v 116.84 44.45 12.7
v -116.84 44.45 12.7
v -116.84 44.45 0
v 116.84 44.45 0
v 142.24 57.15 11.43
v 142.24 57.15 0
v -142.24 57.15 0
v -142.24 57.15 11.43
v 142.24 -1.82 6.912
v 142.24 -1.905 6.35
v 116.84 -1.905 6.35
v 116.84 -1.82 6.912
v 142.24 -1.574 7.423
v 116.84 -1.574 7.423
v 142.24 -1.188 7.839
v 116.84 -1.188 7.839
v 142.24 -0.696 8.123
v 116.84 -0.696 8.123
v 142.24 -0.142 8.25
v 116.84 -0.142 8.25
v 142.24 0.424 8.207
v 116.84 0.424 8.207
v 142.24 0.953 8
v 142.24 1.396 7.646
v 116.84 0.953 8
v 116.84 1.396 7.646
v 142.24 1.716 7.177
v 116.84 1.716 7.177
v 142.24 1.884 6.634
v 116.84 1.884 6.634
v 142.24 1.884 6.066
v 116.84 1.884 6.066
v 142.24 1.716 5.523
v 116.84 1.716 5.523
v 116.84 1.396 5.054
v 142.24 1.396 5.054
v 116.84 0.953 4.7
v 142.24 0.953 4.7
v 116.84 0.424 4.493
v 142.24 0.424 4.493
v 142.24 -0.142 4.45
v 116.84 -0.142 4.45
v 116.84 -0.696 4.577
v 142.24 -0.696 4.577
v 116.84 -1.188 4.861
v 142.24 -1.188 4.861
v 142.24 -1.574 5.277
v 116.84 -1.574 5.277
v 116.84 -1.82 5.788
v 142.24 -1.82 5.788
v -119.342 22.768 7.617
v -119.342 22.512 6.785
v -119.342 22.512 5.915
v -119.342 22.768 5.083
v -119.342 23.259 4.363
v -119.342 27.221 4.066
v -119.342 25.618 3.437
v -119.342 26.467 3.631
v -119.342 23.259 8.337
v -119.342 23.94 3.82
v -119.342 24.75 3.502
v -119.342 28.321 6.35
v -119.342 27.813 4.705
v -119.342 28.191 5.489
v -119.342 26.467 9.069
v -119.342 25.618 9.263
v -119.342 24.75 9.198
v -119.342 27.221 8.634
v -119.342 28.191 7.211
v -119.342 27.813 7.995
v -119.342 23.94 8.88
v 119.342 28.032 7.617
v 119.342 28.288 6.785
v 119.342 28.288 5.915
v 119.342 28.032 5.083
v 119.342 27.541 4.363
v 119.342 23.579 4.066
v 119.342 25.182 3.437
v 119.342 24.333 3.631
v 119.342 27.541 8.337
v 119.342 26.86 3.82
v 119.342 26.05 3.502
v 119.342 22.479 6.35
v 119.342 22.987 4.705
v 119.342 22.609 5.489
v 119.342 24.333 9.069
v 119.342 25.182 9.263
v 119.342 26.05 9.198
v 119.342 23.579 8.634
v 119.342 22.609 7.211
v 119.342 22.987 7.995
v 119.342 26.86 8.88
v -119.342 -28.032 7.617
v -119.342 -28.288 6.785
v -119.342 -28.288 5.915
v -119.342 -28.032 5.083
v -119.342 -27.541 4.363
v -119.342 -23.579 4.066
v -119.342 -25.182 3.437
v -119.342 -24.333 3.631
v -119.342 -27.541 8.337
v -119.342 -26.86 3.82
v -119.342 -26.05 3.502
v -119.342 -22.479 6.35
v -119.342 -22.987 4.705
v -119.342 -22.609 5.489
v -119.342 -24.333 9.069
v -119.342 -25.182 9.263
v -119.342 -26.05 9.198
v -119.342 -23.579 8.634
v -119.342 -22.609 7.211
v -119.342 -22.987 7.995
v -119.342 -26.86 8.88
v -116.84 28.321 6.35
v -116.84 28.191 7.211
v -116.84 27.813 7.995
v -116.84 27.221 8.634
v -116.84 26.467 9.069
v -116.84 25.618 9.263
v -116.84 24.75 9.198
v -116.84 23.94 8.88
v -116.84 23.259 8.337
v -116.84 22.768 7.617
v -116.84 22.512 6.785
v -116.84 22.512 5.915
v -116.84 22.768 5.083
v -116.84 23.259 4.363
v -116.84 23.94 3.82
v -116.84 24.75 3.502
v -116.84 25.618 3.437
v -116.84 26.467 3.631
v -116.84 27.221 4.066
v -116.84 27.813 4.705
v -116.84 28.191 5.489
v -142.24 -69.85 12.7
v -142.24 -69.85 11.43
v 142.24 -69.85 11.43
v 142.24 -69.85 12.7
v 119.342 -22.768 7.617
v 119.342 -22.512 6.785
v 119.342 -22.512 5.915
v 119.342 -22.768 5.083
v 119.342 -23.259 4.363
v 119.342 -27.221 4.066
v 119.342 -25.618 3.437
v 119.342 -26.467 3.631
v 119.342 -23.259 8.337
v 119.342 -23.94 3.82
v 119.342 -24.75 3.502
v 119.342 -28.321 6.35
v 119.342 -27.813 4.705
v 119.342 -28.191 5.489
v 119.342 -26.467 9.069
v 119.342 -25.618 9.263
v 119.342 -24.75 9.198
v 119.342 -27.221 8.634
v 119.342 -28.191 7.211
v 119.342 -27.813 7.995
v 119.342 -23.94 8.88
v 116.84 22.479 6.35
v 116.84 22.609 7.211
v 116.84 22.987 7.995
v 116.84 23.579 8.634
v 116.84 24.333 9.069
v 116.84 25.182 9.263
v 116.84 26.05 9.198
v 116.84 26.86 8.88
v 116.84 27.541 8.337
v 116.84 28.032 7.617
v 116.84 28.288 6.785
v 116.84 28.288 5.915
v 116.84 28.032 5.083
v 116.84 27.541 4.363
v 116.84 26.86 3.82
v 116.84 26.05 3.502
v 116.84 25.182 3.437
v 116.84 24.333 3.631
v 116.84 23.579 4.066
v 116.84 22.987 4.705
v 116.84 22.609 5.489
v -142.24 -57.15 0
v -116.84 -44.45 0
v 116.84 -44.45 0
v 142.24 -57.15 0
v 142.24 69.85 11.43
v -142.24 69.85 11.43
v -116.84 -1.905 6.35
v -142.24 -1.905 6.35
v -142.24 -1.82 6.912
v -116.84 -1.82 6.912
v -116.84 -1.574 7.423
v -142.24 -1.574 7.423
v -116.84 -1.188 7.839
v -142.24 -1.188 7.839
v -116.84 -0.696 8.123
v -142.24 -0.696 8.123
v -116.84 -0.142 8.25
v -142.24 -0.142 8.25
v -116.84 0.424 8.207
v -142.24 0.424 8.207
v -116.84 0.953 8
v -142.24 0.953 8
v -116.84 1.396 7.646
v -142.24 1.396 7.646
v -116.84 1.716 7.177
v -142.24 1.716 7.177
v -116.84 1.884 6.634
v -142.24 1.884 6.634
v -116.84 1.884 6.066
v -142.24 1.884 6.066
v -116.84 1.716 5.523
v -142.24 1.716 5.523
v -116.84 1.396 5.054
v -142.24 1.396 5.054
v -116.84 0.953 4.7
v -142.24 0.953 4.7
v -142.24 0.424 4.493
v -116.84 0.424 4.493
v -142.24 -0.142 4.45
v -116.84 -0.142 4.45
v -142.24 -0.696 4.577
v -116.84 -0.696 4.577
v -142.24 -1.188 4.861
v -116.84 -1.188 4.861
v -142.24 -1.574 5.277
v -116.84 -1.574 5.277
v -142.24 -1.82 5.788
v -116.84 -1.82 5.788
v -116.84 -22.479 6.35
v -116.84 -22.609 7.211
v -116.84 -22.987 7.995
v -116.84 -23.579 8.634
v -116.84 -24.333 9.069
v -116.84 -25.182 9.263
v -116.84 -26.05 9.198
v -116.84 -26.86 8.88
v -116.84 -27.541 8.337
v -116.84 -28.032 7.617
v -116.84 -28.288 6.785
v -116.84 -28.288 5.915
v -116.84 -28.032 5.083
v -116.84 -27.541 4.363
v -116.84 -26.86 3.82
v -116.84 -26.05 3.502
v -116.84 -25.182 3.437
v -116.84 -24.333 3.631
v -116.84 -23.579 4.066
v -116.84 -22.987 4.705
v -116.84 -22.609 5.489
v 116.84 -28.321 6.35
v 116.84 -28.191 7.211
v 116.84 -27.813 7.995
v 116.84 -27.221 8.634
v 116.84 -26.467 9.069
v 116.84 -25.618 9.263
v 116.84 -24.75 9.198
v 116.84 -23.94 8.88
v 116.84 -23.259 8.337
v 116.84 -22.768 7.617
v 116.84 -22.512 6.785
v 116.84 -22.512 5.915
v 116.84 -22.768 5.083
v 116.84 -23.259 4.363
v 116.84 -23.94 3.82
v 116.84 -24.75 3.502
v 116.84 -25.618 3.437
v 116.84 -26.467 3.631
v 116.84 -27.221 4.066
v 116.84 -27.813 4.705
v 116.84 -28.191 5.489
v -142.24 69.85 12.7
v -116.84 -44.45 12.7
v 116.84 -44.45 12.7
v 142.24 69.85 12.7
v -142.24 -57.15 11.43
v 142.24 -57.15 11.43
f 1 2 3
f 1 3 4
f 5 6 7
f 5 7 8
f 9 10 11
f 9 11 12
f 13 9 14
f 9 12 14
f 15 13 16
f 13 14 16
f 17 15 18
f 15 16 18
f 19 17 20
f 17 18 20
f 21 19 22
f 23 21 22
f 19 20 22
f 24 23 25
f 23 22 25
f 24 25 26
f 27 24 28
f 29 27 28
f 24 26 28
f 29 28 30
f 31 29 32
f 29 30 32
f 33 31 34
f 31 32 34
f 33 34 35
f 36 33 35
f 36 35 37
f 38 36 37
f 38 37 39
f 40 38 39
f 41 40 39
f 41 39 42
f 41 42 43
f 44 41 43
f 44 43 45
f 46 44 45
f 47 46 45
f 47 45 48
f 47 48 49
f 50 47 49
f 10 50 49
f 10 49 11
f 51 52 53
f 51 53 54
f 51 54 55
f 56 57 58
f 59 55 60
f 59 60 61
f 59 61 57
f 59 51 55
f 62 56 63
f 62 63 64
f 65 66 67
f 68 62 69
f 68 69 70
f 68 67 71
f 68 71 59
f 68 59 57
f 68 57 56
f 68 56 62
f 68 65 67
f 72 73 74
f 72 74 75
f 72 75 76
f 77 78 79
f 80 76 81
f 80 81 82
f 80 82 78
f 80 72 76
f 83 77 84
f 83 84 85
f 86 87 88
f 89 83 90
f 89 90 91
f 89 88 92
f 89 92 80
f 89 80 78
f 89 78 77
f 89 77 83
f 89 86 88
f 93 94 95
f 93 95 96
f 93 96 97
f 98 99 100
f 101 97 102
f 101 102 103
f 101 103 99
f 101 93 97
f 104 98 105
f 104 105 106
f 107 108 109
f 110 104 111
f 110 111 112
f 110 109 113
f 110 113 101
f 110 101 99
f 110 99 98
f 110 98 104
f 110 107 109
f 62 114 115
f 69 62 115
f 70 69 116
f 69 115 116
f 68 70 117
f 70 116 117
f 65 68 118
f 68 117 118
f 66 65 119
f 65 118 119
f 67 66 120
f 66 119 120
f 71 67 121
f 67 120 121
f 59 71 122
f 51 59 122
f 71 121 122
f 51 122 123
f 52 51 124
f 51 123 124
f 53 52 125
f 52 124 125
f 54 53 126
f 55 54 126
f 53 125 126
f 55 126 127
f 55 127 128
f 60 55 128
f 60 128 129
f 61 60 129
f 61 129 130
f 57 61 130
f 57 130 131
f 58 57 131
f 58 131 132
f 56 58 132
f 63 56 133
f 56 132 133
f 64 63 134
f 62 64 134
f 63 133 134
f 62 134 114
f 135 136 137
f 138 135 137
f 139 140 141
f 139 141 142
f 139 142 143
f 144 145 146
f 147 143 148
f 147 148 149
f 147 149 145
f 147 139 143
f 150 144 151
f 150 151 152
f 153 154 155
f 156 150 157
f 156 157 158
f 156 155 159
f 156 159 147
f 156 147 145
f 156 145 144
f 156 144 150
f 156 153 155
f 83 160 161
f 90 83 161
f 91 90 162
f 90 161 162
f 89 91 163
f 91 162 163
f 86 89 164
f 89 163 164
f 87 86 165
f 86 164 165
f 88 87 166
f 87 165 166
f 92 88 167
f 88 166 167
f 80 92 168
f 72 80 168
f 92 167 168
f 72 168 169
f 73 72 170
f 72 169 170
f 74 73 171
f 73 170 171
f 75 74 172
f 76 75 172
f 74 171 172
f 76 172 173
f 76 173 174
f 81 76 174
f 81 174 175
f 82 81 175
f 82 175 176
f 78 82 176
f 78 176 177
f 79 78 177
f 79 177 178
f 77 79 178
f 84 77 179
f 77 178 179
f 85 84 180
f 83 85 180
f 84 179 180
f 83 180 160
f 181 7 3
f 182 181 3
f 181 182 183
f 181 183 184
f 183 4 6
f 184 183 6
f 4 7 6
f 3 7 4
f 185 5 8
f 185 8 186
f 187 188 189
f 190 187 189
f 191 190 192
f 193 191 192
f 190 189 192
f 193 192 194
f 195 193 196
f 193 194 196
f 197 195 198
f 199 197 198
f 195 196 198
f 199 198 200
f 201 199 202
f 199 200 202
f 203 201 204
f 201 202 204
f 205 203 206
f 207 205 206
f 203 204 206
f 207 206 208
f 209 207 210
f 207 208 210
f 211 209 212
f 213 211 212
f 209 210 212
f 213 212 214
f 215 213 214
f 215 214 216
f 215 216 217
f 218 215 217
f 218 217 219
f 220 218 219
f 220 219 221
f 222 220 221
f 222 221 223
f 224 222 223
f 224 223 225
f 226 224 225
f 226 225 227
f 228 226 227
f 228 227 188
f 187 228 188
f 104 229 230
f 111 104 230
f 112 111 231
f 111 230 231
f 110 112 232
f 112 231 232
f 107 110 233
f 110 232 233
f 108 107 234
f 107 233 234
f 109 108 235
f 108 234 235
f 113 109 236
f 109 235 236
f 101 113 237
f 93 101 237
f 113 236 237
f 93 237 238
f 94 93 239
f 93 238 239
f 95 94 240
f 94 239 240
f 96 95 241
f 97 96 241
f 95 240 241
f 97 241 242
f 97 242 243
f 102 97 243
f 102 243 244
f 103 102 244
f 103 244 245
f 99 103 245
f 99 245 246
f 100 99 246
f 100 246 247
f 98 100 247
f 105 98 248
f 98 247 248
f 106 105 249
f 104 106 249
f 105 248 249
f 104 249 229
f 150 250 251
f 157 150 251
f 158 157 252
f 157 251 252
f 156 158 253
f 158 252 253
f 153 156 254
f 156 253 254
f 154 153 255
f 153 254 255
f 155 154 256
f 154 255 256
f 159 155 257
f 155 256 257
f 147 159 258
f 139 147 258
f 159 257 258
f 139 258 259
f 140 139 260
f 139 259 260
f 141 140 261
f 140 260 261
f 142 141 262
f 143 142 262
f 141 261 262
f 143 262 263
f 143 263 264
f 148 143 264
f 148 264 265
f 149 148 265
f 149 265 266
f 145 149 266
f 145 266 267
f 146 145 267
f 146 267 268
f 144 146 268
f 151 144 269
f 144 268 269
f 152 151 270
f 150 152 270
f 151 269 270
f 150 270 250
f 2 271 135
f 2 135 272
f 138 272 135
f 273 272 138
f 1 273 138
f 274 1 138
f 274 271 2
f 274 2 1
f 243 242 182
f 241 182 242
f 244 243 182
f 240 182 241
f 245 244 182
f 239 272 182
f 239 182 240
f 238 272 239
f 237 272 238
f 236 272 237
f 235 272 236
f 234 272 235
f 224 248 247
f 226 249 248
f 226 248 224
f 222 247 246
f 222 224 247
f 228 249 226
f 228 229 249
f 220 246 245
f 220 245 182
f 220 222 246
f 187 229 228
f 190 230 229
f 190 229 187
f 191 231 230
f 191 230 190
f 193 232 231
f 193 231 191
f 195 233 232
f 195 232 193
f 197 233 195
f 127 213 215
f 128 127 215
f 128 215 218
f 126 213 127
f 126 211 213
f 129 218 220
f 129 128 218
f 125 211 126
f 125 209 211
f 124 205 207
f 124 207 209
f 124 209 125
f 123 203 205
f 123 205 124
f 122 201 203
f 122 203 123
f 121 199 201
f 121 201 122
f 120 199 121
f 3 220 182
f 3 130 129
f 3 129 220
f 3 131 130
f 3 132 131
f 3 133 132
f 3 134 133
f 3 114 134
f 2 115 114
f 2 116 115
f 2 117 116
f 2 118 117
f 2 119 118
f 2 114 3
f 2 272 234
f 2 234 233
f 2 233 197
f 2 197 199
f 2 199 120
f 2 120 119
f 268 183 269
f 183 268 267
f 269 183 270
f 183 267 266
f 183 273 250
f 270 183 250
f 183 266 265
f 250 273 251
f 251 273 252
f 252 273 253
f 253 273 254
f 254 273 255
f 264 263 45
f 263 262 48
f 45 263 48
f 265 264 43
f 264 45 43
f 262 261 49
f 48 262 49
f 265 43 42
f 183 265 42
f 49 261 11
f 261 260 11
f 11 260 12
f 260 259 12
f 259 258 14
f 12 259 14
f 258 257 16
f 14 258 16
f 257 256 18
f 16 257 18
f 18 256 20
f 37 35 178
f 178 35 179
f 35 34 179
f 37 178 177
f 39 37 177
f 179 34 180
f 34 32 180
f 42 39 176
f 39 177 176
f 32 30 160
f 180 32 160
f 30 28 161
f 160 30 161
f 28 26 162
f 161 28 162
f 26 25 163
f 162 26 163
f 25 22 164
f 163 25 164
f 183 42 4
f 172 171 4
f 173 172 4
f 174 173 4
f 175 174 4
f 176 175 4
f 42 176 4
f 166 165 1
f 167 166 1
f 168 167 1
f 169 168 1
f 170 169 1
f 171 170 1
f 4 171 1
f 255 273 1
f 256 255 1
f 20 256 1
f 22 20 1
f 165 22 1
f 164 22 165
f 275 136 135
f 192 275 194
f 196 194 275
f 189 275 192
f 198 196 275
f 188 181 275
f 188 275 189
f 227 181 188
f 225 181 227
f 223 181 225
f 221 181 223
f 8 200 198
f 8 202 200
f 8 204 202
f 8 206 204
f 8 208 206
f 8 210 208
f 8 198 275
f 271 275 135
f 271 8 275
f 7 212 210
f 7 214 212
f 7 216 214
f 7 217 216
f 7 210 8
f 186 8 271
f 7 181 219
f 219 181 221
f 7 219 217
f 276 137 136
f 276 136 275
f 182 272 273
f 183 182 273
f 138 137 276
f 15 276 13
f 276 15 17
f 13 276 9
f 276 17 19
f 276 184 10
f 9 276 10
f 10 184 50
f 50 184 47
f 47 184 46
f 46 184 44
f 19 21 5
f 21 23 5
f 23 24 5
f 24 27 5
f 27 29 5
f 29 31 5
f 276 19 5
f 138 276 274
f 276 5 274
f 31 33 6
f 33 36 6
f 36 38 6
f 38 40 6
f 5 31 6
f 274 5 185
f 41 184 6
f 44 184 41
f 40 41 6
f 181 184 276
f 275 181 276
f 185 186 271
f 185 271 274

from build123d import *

# Parameters (mm, degrees)
F0_W      = 284.48
F0_H      = 139.7
F1_DEPTH  = 12.7
F2_W      = 233.68
F2_H      = 88.9
F3_DEPTH  = 25.4
F4_R      = 1.905
F5_DEPTH  = 508
F6_R      = 2.921
F7_DEPTH  = 2.5019
F8_R      = 2.921
F9_DEPTH  = 2.5019
F10_W     = 12.7
F10_H     = 11.43
F11_DEPTH = 508
F12_W     = 12.7
F12_H     = 11.43
F13_DEPTH = 508


with BuildPart() as f1:
    # F0 (on Top) → F1 (new body)
    with BuildSketch(Plane.XY):
        Rectangle(F0_W, F0_H)
    extrude(amount=F1_DEPTH)

    # F2 (on face) → F3 (cut)
    with BuildSketch(Plane.XY.offset(12.7)):
        Rectangle(F2_W, F2_H)
    extrude(amount=-F3_DEPTH, mode=Mode.SUBTRACT)

    # F4 (on face) → F5 (cut)
    with BuildSketch(Plane(origin=(-142.24, 0, 0), x_dir=(0, -1, 0), z_dir=(-1, 0, 0))):
        with Locations((0, 6.35)):
            Circle(F4_R)
    extrude(amount=-F5_DEPTH, mode=Mode.SUBTRACT)

    # F6 (on face) → F7 (cut)
    with BuildSketch(Plane.YZ.offset(-116.84)):
        with Locations((-25.4, 6.35)):
            Circle(F6_R)
        with Locations((25.4, 6.35)):
            Circle(F6_R)
    extrude(amount=-F7_DEPTH, mode=Mode.SUBTRACT)

    # F8 (on face) → F9 (cut)
    with BuildSketch(Plane(origin=(116.84, 0, 0), x_dir=(0, -1, 0), z_dir=(-1, 0, 0))):
        with Locations((-25.4, 6.35)):
            Circle(F8_R)
        with Locations((25.4, 6.35)):
            Circle(F8_R)
    extrude(amount=-F9_DEPTH, mode=Mode.SUBTRACT)

    # F10 (on face) → F11 (cut)
    with BuildSketch(Plane.YZ.offset(142.24)):
        with Locations((-63.5, 5.715)):
            Rectangle(F10_W, F10_H)
    extrude(amount=-F11_DEPTH, mode=Mode.SUBTRACT)

    # F12 (on face) → F13 (cut)
    with BuildSketch(Plane.YZ.offset(142.24)):
        with Locations((63.5, 5.715)):
            Rectangle(F12_W, F12_H)
    extrude(amount=-F13_DEPTH, mode=Mode.SUBTRACT)


solid = f1.part
